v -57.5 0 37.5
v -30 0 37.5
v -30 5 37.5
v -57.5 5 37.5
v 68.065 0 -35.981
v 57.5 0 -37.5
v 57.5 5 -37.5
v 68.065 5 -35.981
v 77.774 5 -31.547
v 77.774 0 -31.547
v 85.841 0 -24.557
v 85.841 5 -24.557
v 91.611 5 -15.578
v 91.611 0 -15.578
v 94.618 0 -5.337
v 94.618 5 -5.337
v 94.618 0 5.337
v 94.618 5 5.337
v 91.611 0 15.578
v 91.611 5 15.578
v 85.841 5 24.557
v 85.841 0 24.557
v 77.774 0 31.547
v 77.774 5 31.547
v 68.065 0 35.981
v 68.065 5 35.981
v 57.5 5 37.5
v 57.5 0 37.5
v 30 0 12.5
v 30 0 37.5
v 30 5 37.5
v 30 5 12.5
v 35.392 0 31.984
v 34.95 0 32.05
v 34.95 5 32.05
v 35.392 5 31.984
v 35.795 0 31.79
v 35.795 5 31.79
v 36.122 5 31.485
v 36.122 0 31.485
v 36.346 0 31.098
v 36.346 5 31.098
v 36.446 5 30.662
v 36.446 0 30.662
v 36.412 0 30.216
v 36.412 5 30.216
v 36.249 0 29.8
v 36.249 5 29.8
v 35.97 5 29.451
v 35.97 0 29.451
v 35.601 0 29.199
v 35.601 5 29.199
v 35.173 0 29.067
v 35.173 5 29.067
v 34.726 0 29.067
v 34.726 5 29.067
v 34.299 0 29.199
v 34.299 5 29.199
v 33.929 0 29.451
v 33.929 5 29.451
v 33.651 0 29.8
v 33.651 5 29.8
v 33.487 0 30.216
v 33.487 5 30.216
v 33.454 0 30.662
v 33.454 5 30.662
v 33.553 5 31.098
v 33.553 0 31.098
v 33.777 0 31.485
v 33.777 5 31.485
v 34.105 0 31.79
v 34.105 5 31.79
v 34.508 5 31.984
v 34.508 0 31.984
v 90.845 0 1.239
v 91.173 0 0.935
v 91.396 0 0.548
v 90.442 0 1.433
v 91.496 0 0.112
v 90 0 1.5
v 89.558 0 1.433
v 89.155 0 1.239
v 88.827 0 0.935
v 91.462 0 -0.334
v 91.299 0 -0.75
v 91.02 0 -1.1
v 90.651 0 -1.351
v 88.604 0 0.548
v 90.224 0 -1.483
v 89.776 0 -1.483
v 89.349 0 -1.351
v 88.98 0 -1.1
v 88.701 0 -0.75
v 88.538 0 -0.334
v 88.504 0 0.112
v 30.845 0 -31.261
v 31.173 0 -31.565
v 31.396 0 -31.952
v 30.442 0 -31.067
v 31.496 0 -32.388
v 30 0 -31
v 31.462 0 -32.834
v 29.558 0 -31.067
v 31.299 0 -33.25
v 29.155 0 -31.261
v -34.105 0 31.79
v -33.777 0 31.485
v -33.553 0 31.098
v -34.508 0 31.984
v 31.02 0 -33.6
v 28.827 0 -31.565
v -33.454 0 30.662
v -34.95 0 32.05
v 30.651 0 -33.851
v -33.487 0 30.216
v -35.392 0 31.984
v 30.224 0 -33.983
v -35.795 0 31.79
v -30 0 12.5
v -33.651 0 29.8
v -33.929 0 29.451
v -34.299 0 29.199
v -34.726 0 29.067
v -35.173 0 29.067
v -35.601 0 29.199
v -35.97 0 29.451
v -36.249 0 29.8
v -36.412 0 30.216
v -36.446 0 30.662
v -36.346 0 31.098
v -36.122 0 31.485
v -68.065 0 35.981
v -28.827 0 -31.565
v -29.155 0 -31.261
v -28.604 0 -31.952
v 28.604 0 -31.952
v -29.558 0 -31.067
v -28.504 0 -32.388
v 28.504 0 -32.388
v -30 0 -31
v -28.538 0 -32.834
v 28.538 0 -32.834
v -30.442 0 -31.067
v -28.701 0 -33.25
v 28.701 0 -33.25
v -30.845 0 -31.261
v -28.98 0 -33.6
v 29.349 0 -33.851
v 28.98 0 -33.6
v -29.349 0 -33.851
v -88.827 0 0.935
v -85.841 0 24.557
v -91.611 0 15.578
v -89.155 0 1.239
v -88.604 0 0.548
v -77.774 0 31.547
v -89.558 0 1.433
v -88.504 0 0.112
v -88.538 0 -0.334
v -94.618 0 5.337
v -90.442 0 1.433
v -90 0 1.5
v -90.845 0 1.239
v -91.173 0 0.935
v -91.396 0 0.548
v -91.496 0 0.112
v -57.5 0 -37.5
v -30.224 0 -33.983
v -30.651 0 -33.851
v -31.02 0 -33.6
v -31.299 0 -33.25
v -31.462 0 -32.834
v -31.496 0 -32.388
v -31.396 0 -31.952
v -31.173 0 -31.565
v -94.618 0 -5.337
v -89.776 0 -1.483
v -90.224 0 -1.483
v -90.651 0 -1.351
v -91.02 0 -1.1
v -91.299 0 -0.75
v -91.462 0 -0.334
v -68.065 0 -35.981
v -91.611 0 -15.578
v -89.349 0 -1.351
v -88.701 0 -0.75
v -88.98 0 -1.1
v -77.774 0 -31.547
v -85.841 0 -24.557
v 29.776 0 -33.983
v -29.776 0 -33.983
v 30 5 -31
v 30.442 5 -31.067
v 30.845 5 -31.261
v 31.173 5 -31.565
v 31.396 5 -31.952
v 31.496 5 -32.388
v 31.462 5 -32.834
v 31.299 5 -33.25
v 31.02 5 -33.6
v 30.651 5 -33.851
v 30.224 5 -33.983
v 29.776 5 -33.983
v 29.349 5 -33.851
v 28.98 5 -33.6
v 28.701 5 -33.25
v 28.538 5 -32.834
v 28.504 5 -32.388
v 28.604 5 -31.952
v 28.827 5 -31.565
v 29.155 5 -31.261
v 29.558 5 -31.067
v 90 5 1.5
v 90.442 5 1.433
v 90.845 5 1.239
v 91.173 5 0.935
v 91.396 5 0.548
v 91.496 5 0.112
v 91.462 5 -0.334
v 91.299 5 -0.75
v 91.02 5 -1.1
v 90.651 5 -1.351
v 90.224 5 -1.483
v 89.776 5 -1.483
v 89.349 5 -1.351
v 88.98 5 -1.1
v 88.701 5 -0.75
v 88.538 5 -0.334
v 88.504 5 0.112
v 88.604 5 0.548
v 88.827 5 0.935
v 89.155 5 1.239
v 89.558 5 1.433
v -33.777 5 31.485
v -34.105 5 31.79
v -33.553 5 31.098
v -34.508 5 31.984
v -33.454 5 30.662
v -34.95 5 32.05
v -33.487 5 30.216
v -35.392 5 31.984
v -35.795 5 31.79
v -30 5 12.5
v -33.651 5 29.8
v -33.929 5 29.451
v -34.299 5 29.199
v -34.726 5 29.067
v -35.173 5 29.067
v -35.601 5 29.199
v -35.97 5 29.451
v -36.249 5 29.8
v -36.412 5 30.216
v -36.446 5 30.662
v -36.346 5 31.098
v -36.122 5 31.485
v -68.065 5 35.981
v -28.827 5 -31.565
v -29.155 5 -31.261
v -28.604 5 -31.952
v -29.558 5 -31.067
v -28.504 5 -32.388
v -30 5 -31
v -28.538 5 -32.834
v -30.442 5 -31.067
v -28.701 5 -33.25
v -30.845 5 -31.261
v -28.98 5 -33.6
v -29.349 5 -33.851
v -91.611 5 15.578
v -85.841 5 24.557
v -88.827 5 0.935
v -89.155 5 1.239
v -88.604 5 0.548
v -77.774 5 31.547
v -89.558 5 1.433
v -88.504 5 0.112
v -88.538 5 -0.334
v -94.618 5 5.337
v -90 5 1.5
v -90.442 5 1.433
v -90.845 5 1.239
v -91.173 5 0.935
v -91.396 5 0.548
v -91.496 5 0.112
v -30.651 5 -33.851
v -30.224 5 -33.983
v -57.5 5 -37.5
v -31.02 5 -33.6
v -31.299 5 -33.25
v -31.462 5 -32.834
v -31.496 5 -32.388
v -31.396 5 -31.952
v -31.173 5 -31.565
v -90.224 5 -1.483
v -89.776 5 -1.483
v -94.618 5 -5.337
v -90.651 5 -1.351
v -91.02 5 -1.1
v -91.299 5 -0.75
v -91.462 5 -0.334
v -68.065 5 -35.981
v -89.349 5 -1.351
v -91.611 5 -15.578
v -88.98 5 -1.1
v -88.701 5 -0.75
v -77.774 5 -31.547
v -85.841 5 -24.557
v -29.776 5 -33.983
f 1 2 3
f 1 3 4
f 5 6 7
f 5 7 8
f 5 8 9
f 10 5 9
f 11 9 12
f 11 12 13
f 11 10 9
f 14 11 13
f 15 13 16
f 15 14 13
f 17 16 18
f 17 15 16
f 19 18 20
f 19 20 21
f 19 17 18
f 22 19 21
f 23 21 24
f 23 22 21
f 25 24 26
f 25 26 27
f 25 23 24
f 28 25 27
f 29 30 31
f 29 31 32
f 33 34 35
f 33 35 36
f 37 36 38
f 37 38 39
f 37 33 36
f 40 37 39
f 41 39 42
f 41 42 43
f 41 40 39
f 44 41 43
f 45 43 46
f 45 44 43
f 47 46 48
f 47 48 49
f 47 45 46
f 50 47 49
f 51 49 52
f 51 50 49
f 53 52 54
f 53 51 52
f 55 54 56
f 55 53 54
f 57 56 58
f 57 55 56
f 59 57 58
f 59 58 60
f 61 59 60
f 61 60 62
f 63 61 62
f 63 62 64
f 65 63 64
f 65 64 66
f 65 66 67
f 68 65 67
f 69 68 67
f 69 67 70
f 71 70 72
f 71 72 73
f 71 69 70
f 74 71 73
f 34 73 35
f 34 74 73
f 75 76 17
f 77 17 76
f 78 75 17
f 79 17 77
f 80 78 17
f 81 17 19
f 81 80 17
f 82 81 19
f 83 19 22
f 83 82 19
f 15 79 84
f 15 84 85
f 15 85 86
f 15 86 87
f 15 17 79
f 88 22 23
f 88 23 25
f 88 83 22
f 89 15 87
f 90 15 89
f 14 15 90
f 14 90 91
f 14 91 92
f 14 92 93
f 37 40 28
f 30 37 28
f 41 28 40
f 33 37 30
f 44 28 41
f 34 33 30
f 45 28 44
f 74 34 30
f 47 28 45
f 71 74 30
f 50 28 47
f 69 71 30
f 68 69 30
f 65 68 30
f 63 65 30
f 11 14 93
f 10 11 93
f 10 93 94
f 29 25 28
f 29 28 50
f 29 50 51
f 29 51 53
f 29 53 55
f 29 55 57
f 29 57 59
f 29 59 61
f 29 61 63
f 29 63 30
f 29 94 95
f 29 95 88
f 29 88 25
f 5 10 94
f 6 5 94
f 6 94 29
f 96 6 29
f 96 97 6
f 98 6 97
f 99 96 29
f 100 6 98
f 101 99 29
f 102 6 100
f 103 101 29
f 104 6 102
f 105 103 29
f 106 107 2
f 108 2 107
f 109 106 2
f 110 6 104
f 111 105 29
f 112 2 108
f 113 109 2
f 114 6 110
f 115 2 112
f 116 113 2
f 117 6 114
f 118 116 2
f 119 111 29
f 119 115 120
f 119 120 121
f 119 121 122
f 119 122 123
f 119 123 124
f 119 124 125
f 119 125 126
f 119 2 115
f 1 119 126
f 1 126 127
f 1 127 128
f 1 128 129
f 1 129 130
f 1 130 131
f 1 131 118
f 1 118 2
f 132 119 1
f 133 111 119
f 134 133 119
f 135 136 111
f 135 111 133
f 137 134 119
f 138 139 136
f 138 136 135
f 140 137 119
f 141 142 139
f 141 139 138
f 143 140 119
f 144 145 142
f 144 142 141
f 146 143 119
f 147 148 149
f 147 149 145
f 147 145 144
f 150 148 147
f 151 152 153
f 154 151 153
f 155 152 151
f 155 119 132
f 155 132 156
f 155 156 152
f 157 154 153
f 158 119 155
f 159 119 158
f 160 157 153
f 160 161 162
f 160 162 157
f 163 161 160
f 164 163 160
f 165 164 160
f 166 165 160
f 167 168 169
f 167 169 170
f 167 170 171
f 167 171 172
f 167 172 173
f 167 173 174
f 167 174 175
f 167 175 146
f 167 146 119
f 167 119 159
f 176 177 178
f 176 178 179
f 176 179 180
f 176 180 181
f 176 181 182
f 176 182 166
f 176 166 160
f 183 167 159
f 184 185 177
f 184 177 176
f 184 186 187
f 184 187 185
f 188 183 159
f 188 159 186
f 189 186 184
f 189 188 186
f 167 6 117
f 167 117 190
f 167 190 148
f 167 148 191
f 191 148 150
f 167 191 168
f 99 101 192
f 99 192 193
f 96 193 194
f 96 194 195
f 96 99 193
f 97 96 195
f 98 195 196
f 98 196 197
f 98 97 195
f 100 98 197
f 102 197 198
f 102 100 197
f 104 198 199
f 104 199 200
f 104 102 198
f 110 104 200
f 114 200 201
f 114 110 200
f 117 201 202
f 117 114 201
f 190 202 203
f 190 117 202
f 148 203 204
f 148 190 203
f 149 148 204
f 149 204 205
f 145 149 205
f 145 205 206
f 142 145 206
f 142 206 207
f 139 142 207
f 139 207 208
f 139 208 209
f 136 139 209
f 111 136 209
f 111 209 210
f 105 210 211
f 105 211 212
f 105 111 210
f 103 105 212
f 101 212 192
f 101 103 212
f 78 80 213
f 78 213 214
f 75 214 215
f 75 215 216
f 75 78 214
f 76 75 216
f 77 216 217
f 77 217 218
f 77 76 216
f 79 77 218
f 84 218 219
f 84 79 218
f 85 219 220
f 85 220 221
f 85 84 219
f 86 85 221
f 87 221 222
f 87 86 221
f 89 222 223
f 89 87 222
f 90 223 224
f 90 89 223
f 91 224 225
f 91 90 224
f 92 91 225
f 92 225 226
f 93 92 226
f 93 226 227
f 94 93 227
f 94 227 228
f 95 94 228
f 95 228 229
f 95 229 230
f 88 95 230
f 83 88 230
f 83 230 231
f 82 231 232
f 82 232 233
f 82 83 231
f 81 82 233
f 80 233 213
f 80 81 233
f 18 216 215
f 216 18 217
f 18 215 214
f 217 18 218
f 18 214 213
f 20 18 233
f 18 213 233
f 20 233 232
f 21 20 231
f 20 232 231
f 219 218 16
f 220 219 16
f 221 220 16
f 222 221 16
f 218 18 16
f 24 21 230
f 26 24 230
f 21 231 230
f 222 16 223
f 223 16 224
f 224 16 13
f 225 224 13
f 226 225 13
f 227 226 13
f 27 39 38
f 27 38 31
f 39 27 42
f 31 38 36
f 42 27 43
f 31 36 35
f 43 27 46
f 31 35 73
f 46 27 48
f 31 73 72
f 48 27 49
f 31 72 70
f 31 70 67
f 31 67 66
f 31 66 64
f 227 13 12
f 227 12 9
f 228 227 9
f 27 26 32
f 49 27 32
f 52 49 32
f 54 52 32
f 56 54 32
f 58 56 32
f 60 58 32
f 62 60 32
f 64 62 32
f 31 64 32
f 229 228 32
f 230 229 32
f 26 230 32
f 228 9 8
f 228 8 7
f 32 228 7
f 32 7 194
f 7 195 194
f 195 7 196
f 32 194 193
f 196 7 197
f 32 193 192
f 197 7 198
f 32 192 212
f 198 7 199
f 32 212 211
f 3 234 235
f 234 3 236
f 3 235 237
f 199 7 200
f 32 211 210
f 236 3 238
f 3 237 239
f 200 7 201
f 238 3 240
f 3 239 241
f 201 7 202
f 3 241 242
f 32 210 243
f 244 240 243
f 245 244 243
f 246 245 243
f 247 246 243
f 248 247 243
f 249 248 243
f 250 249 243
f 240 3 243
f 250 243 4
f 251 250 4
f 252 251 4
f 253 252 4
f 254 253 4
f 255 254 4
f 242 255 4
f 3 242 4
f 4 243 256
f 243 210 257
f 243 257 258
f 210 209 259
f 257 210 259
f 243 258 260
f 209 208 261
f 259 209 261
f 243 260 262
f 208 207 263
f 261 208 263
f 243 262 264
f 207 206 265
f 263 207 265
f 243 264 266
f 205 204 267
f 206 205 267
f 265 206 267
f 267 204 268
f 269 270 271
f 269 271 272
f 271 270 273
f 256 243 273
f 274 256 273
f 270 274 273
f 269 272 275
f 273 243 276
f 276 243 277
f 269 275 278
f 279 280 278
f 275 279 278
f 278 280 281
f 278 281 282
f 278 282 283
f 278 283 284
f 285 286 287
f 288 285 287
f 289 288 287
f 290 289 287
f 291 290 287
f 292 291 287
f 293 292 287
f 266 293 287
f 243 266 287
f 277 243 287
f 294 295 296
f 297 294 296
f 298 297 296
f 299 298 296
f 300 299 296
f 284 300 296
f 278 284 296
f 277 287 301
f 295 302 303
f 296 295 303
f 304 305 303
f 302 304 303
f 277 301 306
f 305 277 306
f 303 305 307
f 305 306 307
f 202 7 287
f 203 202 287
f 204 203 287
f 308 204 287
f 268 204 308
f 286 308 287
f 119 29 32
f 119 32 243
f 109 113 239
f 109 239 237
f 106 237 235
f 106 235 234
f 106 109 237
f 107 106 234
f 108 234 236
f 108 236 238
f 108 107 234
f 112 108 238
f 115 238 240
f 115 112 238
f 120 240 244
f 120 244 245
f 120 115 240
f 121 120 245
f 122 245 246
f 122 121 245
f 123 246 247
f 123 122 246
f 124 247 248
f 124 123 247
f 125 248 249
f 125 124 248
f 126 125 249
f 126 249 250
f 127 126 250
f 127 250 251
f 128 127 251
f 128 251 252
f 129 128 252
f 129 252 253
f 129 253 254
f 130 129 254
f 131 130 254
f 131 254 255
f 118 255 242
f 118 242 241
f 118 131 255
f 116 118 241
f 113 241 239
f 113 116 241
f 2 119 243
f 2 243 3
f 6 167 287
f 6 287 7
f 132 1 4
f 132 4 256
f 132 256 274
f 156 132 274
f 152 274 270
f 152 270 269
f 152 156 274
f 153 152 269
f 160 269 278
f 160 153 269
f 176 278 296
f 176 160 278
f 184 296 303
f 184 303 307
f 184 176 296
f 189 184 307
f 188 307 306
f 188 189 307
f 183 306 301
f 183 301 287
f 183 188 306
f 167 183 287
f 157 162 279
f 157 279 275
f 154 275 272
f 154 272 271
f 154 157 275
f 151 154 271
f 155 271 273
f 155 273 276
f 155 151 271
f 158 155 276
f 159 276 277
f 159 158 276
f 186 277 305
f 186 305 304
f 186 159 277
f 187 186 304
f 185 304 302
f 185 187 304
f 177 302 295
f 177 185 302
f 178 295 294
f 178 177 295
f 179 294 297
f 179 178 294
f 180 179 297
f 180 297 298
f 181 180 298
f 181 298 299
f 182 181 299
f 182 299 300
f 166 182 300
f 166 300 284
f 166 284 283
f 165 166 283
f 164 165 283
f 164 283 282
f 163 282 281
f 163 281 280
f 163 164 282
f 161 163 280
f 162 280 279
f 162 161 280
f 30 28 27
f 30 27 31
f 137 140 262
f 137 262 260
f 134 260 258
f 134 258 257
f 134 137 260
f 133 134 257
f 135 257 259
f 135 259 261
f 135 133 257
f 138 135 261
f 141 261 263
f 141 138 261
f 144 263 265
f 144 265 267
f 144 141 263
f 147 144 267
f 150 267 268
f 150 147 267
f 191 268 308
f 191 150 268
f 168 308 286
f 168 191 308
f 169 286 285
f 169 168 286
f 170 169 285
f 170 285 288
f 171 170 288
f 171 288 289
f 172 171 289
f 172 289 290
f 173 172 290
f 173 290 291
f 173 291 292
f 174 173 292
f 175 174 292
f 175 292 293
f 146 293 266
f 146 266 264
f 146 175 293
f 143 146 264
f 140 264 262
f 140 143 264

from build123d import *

# Parameters (mm, degrees)
SKETCH1_R           = 1.5
BOSS_EXTRUDE1_DEPTH = 5


with BuildPart() as part:
    # Sketch1 → Boss-Extrude1 (new body)
    with BuildSketch(Plane(origin=(0, 0, 0), x_dir=(1, 0, 0), z_dir=(0, 1, 0))):
        with BuildLine():
            Line((-57.5, 37.5), (57.5, 37.5))
            ThreePointArc((57.5, 37.5), (95, 0), (57.5, -37.5))
            Line((57.5, -37.5), (30, -37.5))
            Line((30, -37.5), (30, -12.5))
            Line((30, -12.5), (-30, -12.5))
            Line((-30, -12.5), (-30, -37.5))
            Line((-30, -37.5), (-57.5, -37.5))
            ThreePointArc((-57.5, -37.5), (-95, 0), (-57.5, 37.5))
        make_face()
        with Locations(Location((-90, 0, 0), (0, 0, 270))):
            Circle(SKETCH1_R, mode=Mode.SUBTRACT)
        with Locations(Location((-30, 32.5, 0), (0, 0, 270))):
            Circle(SKETCH1_R, mode=Mode.SUBTRACT)
        with Locations(Location((30, 32.5, 0), (0, 0, 270))):
            Circle(SKETCH1_R, mode=Mode.SUBTRACT)
        with Locations(Location((90, 0, 0), (0, 0, 270))):
            Circle(SKETCH1_R, mode=Mode.SUBTRACT)
        with Locations(Location((34.949747468, -30.550252532, 0), (0, 0, 270))):
            Circle(SKETCH1_R, mode=Mode.SUBTRACT)
        with Locations(Location((-34.949747468, -30.550252532, 0), (0, 0, 270))):
            Circle(SKETCH1_R, mode=Mode.SUBTRACT)
    extrude(amount=BOSS_EXTRUDE1_DEPTH)


solid = part.part
